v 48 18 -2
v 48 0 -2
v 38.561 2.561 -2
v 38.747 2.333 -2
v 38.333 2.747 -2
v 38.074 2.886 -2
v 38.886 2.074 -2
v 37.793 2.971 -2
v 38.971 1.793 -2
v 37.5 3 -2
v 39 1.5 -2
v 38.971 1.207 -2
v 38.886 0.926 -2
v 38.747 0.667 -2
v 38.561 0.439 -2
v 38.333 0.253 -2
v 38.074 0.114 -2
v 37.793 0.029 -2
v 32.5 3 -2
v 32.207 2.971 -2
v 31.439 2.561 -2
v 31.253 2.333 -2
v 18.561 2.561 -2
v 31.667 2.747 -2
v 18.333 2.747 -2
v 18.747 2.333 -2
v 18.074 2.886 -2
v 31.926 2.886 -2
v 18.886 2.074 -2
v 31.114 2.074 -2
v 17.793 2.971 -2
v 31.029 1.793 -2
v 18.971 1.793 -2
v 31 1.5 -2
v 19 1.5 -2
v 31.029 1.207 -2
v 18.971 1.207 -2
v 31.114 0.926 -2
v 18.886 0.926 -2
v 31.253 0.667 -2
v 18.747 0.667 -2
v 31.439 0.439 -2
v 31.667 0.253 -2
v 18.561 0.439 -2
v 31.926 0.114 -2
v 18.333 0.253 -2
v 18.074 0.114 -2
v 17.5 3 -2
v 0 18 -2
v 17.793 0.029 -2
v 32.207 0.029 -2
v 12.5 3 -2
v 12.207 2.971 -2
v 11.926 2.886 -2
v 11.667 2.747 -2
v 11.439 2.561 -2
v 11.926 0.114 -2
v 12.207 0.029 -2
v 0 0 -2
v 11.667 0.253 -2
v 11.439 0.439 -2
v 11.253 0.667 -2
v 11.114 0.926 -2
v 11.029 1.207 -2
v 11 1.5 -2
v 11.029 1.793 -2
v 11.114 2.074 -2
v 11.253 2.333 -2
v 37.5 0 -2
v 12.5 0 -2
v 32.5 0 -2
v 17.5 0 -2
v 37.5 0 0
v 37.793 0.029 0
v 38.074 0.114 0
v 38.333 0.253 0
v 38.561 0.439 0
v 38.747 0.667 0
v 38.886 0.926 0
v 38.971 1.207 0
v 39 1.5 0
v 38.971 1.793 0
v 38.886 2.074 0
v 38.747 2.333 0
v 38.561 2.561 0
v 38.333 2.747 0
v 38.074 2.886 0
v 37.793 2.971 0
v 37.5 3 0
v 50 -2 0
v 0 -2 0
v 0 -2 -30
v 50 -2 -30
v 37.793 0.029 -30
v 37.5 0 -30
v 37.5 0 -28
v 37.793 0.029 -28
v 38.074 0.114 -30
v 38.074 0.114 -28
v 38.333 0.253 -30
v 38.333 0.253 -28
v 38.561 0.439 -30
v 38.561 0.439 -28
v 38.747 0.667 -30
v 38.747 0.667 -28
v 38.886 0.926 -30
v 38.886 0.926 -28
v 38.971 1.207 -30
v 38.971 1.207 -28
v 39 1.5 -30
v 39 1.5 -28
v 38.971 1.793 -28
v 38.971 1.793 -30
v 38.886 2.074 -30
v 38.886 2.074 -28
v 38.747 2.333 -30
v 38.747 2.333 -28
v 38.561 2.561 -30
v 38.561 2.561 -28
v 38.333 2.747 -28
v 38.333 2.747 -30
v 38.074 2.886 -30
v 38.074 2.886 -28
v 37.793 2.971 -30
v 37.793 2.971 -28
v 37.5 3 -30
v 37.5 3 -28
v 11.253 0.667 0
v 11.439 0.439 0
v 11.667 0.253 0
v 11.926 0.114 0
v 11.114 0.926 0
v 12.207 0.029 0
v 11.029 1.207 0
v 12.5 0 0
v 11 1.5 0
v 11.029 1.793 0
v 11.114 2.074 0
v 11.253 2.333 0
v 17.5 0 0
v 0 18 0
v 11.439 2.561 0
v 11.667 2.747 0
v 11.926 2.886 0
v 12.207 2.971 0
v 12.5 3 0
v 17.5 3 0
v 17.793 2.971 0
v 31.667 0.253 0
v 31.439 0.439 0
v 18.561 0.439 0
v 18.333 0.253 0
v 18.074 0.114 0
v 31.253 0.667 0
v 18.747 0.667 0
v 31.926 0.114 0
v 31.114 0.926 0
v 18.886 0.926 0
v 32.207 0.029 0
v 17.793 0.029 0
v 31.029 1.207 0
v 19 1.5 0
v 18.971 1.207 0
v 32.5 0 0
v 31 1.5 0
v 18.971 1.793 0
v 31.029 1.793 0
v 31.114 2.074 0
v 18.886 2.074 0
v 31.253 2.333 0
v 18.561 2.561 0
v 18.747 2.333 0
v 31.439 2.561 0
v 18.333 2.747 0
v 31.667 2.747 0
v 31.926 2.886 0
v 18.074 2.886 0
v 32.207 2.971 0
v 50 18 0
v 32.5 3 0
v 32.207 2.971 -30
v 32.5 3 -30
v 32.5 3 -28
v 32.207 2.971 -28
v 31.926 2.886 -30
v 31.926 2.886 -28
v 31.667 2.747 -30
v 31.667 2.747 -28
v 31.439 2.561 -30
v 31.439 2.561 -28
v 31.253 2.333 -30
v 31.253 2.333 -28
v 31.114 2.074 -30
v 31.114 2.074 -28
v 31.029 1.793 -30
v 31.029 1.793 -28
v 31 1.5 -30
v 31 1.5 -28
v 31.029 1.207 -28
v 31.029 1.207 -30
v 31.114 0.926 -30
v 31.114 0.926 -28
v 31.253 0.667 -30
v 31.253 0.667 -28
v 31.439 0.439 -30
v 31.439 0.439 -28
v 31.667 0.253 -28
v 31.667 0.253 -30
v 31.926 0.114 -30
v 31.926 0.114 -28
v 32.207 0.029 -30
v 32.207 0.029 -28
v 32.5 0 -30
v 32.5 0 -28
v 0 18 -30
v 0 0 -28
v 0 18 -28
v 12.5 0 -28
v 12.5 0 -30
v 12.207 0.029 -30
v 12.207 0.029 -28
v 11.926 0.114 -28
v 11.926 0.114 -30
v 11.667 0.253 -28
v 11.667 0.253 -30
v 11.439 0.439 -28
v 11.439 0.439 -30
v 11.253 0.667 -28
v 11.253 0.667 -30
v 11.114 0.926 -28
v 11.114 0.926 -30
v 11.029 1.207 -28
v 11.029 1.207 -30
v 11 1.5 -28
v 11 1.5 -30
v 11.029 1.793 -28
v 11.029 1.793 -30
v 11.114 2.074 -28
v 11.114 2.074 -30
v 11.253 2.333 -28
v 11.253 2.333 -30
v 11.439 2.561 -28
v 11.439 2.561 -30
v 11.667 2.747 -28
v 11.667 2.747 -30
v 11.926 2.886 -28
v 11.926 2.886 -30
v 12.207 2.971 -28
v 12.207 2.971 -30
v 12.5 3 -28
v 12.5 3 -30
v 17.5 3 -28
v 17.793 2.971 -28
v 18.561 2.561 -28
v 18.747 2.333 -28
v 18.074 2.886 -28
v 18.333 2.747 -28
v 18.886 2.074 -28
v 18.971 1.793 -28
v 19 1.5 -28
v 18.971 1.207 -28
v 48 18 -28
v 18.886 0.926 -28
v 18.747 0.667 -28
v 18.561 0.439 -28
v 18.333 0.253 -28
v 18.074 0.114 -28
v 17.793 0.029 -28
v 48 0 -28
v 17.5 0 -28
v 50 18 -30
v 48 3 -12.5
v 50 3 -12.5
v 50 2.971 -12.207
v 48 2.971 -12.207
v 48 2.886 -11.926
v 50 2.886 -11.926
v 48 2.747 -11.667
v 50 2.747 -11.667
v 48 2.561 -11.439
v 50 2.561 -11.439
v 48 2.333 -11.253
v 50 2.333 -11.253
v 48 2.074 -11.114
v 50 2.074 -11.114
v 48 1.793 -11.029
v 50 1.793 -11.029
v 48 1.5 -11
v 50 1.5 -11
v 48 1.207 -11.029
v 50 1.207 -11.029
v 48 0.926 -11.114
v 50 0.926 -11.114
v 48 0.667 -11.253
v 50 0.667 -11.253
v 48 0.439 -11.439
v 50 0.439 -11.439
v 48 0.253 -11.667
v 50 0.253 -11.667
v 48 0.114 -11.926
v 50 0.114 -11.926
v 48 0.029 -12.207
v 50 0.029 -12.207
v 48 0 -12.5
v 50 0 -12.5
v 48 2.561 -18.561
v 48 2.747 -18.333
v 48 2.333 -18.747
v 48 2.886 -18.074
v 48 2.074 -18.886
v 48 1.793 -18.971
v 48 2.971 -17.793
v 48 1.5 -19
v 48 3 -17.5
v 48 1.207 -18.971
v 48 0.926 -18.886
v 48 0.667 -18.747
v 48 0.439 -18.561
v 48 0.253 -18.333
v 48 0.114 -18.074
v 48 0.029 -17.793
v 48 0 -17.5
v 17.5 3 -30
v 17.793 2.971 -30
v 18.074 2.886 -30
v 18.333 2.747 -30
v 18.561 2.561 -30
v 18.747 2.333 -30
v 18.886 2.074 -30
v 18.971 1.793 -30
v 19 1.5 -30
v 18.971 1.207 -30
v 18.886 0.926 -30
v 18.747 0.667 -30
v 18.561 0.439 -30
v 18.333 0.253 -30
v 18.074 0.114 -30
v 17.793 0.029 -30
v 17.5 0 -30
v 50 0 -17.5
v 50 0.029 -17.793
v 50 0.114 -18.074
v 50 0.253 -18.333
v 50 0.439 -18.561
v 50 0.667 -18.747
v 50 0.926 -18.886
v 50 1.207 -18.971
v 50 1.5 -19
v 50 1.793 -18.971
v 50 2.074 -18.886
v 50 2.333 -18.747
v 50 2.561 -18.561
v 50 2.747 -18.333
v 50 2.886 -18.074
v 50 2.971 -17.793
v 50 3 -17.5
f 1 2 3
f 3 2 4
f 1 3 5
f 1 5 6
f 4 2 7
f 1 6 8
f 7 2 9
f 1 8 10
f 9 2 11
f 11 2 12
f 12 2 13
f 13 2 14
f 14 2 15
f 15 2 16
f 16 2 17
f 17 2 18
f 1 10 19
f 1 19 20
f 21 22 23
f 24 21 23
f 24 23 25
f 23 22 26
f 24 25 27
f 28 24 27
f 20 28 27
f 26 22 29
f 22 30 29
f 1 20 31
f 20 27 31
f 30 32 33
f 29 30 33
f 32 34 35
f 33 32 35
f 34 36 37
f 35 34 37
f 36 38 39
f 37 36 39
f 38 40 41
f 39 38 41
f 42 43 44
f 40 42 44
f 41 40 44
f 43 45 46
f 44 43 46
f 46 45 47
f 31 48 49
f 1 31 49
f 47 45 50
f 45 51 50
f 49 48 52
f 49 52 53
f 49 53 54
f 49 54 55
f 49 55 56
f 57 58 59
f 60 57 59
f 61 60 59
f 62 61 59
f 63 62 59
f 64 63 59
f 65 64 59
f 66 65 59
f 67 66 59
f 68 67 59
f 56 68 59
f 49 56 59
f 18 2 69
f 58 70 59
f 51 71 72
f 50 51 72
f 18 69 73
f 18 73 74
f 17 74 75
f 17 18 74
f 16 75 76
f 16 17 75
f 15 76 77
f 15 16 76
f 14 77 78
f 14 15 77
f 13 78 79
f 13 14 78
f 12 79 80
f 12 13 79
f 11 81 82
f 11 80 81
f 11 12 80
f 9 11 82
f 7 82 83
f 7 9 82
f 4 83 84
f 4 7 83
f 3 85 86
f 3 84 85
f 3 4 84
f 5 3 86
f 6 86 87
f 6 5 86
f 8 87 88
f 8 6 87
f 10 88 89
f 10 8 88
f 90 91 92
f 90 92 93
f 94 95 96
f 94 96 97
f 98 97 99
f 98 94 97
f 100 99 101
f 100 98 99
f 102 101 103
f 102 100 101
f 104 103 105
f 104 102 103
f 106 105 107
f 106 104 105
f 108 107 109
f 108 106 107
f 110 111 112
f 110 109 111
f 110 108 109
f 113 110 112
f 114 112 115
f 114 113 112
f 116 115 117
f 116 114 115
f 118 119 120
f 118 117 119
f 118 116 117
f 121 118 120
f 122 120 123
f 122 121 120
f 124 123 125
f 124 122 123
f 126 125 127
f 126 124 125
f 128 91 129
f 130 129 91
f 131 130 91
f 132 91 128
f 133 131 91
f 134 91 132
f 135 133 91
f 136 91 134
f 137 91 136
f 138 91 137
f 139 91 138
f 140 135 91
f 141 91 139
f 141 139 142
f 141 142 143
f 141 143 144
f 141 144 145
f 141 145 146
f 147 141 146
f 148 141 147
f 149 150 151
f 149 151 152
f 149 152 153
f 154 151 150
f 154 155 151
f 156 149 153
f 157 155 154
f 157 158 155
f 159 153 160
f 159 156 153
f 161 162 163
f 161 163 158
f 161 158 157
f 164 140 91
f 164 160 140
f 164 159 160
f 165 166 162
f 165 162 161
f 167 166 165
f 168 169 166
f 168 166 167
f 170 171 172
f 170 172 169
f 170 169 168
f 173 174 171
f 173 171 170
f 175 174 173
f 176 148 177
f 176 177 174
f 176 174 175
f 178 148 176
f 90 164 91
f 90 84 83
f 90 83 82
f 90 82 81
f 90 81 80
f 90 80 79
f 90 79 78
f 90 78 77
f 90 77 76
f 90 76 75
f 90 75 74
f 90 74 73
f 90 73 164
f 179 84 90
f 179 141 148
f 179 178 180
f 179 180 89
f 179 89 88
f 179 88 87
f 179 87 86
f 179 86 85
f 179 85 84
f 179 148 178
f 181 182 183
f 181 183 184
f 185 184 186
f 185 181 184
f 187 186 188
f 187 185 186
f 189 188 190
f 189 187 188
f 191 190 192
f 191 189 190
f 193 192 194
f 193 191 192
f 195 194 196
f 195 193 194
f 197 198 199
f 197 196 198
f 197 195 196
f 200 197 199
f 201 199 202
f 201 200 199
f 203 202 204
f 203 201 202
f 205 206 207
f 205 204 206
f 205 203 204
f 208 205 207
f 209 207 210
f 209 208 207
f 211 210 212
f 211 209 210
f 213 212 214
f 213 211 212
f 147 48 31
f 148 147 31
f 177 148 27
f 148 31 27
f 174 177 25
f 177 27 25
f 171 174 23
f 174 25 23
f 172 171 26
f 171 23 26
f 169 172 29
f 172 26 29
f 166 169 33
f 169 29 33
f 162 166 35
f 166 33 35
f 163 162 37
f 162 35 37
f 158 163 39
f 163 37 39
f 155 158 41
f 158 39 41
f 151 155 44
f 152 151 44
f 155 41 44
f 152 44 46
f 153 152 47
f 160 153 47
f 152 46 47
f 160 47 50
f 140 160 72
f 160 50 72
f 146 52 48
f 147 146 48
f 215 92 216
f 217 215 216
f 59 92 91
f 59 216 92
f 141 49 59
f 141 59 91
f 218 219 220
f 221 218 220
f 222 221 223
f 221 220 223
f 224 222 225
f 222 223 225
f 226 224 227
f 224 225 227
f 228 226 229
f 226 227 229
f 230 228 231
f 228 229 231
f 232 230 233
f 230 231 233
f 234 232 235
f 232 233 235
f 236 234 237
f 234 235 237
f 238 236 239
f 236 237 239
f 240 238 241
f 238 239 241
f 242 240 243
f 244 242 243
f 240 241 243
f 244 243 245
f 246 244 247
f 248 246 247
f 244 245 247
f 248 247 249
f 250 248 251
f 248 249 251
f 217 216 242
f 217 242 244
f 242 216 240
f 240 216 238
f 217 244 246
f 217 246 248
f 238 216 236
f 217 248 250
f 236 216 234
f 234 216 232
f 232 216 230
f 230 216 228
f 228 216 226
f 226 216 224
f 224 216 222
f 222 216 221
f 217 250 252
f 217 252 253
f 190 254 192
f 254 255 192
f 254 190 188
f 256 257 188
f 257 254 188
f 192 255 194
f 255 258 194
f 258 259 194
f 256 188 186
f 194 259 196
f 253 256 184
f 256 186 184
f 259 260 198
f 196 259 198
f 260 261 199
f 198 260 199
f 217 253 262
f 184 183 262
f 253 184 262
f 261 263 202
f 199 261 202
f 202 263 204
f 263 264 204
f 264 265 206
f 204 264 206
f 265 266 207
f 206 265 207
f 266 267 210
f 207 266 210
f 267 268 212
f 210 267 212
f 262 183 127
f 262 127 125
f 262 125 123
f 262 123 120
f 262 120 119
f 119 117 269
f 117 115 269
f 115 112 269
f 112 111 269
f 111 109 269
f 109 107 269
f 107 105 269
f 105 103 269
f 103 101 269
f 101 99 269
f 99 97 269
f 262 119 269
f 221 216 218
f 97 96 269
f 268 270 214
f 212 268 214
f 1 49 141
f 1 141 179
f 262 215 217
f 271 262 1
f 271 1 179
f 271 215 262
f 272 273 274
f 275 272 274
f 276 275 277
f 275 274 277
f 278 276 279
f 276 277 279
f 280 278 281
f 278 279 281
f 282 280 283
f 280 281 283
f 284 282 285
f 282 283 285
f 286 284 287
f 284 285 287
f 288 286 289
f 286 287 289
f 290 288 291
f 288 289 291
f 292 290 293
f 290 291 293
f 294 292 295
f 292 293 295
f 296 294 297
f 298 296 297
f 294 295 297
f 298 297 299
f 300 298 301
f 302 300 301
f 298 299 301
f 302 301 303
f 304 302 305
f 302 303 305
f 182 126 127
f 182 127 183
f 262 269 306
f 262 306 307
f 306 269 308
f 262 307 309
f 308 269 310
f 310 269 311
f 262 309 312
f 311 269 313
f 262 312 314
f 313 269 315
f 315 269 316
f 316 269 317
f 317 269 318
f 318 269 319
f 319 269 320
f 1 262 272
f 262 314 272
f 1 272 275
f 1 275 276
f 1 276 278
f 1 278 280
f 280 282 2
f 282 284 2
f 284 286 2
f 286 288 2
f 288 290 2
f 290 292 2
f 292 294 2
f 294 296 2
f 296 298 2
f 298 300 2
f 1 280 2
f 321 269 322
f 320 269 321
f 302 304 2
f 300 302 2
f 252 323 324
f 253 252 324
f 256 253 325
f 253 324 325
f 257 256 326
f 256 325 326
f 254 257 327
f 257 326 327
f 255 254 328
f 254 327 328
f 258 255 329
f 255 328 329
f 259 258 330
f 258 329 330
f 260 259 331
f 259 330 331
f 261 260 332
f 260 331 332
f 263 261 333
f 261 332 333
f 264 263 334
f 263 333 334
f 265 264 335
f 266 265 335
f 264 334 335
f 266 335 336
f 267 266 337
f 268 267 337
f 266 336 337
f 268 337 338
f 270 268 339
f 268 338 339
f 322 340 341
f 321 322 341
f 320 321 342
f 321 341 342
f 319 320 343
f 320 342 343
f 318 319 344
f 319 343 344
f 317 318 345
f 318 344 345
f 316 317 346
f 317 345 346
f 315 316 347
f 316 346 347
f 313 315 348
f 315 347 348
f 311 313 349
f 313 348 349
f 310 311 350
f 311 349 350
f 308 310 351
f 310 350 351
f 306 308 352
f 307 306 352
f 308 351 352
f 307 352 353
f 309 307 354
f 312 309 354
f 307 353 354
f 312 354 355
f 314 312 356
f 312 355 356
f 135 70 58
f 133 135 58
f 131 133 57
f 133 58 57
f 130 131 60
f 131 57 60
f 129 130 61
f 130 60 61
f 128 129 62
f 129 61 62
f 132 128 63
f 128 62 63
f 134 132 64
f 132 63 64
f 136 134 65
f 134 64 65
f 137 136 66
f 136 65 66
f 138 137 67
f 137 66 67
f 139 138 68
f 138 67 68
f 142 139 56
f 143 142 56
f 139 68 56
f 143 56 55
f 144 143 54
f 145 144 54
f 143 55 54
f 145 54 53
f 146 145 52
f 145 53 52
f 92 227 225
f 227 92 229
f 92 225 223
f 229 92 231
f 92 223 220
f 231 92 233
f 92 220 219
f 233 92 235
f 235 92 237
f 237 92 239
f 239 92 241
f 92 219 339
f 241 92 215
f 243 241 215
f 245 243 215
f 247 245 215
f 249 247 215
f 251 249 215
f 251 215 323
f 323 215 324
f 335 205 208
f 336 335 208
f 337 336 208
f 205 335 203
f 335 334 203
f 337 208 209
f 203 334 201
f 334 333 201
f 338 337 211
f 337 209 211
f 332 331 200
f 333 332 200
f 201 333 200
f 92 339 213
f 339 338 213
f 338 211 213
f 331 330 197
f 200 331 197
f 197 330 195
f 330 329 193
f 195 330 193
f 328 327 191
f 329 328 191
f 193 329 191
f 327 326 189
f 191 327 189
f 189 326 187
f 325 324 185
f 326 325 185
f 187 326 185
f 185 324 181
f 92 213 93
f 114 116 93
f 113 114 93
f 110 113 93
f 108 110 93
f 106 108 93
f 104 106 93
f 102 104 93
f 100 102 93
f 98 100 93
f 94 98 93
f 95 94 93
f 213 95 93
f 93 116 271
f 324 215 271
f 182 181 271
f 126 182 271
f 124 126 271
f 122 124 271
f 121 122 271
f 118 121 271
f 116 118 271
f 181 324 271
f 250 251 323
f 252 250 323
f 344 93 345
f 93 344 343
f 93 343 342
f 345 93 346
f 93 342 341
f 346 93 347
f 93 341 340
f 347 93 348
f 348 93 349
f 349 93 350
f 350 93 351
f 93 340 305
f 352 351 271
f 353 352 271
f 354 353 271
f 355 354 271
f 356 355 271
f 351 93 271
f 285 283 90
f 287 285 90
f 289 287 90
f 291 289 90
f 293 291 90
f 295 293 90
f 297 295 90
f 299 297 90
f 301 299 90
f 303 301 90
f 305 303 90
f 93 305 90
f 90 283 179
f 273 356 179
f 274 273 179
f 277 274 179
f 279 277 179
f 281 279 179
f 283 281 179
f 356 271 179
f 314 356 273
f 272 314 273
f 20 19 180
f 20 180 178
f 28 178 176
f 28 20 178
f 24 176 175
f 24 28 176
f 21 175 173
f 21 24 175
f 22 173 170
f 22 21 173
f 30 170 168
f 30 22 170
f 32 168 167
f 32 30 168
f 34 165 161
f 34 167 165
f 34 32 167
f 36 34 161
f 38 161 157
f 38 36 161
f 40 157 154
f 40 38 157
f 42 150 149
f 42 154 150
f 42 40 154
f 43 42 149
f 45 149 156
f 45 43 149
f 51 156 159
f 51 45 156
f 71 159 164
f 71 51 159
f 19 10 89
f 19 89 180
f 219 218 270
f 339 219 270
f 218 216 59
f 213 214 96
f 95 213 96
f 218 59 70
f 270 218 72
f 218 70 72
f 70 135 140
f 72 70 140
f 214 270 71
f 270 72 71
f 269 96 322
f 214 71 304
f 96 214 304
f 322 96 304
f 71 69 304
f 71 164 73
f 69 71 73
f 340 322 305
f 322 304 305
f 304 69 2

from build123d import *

# Parameters (mm, degrees)
EXTRUDE_THIN1_DEPTH     = 18
SKETCH2_W               = 50
SKETCH2_H               = 30
BOSS_EXTRUDE1_DEPTH     = 2
CUT_EXTRUDE1_DEPTH      = 62.02458521
CUT_EXTRUDE1_DEPTH_BACK = 62.02458521
CUT_EXTRUDE2_DEPTH      = 60.39696962
CUT_EXTRUDE2_DEPTH_BACK = 60.39696962


with BuildPart() as part:
    # Sketch1 → Extrude-Thin1 (new body)
    with BuildSketch(Plane(origin=(0, 0, 0), x_dir=(1, 0, 0), z_dir=(0, 1, 0))):
        Polygon((0, 28), (48, 28), (48, 2), (0, 2), (0, 0), (50, 0), (50, 30), (0, 30), align=None)
    extrude(amount=EXTRUDE_THIN1_DEPTH)

    # Sketch2 → Boss-Extrude1 (add)
    with BuildSketch(Plane.XZ):
        with Locations((25, -15)):
            Rectangle(SKETCH2_W, SKETCH2_H)
    extrude(amount=BOSS_EXTRUDE1_DEPTH)

    # Sketch3 → Cut-Extrude1 (cut, two sides: drawn at the far end of the back side and taken through both)
    with BuildSketch(Plane.XY.offset(-CUT_EXTRUDE1_DEPTH_BACK)):
        with BuildLine():
            Line((12.5, 3), (17.5, 3))
            ThreePointArc((17.5, 3), (19, 1.5), (17.5, 0))
            Line((17.5, 0), (12.5, 0))
            ThreePointArc((12.5, 0), (11, 1.5), (12.5, 3))
        make_face()
        with BuildLine():
            Line((37.5, 3), (32.5, 3))
            ThreePointArc((32.5, 3), (31, 1.5), (32.5, 0))
            Line((32.5, 0), (37.5, 0))
            ThreePointArc((37.5, 0), (39, 1.5), (37.5, 3))
        make_face()
    extrude(amount=CUT_EXTRUDE1_DEPTH + CUT_EXTRUDE1_DEPTH_BACK, mode=Mode.SUBTRACT)

    # Sketch4 → Cut-Extrude2 (cut, two sides: drawn at the far end of the back side and taken through both)
    with BuildSketch(Plane.ZY.offset(-48).offset(-CUT_EXTRUDE2_DEPTH_BACK)):
        with BuildLine():
            Line((-17.5, 3), (-12.5, 3))
            ThreePointArc((-12.5, 3), (-11, 1.5), (-12.5, 0))
            Line((-12.5, 0), (-17.5, 0))
            ThreePointArc((-17.5, 0), (-19, 1.5), (-17.5, 3))
        make_face()
    extrude(amount=CUT_EXTRUDE2_DEPTH + CUT_EXTRUDE2_DEPTH_BACK, mode=Mode.SUBTRACT)


solid = part.part
